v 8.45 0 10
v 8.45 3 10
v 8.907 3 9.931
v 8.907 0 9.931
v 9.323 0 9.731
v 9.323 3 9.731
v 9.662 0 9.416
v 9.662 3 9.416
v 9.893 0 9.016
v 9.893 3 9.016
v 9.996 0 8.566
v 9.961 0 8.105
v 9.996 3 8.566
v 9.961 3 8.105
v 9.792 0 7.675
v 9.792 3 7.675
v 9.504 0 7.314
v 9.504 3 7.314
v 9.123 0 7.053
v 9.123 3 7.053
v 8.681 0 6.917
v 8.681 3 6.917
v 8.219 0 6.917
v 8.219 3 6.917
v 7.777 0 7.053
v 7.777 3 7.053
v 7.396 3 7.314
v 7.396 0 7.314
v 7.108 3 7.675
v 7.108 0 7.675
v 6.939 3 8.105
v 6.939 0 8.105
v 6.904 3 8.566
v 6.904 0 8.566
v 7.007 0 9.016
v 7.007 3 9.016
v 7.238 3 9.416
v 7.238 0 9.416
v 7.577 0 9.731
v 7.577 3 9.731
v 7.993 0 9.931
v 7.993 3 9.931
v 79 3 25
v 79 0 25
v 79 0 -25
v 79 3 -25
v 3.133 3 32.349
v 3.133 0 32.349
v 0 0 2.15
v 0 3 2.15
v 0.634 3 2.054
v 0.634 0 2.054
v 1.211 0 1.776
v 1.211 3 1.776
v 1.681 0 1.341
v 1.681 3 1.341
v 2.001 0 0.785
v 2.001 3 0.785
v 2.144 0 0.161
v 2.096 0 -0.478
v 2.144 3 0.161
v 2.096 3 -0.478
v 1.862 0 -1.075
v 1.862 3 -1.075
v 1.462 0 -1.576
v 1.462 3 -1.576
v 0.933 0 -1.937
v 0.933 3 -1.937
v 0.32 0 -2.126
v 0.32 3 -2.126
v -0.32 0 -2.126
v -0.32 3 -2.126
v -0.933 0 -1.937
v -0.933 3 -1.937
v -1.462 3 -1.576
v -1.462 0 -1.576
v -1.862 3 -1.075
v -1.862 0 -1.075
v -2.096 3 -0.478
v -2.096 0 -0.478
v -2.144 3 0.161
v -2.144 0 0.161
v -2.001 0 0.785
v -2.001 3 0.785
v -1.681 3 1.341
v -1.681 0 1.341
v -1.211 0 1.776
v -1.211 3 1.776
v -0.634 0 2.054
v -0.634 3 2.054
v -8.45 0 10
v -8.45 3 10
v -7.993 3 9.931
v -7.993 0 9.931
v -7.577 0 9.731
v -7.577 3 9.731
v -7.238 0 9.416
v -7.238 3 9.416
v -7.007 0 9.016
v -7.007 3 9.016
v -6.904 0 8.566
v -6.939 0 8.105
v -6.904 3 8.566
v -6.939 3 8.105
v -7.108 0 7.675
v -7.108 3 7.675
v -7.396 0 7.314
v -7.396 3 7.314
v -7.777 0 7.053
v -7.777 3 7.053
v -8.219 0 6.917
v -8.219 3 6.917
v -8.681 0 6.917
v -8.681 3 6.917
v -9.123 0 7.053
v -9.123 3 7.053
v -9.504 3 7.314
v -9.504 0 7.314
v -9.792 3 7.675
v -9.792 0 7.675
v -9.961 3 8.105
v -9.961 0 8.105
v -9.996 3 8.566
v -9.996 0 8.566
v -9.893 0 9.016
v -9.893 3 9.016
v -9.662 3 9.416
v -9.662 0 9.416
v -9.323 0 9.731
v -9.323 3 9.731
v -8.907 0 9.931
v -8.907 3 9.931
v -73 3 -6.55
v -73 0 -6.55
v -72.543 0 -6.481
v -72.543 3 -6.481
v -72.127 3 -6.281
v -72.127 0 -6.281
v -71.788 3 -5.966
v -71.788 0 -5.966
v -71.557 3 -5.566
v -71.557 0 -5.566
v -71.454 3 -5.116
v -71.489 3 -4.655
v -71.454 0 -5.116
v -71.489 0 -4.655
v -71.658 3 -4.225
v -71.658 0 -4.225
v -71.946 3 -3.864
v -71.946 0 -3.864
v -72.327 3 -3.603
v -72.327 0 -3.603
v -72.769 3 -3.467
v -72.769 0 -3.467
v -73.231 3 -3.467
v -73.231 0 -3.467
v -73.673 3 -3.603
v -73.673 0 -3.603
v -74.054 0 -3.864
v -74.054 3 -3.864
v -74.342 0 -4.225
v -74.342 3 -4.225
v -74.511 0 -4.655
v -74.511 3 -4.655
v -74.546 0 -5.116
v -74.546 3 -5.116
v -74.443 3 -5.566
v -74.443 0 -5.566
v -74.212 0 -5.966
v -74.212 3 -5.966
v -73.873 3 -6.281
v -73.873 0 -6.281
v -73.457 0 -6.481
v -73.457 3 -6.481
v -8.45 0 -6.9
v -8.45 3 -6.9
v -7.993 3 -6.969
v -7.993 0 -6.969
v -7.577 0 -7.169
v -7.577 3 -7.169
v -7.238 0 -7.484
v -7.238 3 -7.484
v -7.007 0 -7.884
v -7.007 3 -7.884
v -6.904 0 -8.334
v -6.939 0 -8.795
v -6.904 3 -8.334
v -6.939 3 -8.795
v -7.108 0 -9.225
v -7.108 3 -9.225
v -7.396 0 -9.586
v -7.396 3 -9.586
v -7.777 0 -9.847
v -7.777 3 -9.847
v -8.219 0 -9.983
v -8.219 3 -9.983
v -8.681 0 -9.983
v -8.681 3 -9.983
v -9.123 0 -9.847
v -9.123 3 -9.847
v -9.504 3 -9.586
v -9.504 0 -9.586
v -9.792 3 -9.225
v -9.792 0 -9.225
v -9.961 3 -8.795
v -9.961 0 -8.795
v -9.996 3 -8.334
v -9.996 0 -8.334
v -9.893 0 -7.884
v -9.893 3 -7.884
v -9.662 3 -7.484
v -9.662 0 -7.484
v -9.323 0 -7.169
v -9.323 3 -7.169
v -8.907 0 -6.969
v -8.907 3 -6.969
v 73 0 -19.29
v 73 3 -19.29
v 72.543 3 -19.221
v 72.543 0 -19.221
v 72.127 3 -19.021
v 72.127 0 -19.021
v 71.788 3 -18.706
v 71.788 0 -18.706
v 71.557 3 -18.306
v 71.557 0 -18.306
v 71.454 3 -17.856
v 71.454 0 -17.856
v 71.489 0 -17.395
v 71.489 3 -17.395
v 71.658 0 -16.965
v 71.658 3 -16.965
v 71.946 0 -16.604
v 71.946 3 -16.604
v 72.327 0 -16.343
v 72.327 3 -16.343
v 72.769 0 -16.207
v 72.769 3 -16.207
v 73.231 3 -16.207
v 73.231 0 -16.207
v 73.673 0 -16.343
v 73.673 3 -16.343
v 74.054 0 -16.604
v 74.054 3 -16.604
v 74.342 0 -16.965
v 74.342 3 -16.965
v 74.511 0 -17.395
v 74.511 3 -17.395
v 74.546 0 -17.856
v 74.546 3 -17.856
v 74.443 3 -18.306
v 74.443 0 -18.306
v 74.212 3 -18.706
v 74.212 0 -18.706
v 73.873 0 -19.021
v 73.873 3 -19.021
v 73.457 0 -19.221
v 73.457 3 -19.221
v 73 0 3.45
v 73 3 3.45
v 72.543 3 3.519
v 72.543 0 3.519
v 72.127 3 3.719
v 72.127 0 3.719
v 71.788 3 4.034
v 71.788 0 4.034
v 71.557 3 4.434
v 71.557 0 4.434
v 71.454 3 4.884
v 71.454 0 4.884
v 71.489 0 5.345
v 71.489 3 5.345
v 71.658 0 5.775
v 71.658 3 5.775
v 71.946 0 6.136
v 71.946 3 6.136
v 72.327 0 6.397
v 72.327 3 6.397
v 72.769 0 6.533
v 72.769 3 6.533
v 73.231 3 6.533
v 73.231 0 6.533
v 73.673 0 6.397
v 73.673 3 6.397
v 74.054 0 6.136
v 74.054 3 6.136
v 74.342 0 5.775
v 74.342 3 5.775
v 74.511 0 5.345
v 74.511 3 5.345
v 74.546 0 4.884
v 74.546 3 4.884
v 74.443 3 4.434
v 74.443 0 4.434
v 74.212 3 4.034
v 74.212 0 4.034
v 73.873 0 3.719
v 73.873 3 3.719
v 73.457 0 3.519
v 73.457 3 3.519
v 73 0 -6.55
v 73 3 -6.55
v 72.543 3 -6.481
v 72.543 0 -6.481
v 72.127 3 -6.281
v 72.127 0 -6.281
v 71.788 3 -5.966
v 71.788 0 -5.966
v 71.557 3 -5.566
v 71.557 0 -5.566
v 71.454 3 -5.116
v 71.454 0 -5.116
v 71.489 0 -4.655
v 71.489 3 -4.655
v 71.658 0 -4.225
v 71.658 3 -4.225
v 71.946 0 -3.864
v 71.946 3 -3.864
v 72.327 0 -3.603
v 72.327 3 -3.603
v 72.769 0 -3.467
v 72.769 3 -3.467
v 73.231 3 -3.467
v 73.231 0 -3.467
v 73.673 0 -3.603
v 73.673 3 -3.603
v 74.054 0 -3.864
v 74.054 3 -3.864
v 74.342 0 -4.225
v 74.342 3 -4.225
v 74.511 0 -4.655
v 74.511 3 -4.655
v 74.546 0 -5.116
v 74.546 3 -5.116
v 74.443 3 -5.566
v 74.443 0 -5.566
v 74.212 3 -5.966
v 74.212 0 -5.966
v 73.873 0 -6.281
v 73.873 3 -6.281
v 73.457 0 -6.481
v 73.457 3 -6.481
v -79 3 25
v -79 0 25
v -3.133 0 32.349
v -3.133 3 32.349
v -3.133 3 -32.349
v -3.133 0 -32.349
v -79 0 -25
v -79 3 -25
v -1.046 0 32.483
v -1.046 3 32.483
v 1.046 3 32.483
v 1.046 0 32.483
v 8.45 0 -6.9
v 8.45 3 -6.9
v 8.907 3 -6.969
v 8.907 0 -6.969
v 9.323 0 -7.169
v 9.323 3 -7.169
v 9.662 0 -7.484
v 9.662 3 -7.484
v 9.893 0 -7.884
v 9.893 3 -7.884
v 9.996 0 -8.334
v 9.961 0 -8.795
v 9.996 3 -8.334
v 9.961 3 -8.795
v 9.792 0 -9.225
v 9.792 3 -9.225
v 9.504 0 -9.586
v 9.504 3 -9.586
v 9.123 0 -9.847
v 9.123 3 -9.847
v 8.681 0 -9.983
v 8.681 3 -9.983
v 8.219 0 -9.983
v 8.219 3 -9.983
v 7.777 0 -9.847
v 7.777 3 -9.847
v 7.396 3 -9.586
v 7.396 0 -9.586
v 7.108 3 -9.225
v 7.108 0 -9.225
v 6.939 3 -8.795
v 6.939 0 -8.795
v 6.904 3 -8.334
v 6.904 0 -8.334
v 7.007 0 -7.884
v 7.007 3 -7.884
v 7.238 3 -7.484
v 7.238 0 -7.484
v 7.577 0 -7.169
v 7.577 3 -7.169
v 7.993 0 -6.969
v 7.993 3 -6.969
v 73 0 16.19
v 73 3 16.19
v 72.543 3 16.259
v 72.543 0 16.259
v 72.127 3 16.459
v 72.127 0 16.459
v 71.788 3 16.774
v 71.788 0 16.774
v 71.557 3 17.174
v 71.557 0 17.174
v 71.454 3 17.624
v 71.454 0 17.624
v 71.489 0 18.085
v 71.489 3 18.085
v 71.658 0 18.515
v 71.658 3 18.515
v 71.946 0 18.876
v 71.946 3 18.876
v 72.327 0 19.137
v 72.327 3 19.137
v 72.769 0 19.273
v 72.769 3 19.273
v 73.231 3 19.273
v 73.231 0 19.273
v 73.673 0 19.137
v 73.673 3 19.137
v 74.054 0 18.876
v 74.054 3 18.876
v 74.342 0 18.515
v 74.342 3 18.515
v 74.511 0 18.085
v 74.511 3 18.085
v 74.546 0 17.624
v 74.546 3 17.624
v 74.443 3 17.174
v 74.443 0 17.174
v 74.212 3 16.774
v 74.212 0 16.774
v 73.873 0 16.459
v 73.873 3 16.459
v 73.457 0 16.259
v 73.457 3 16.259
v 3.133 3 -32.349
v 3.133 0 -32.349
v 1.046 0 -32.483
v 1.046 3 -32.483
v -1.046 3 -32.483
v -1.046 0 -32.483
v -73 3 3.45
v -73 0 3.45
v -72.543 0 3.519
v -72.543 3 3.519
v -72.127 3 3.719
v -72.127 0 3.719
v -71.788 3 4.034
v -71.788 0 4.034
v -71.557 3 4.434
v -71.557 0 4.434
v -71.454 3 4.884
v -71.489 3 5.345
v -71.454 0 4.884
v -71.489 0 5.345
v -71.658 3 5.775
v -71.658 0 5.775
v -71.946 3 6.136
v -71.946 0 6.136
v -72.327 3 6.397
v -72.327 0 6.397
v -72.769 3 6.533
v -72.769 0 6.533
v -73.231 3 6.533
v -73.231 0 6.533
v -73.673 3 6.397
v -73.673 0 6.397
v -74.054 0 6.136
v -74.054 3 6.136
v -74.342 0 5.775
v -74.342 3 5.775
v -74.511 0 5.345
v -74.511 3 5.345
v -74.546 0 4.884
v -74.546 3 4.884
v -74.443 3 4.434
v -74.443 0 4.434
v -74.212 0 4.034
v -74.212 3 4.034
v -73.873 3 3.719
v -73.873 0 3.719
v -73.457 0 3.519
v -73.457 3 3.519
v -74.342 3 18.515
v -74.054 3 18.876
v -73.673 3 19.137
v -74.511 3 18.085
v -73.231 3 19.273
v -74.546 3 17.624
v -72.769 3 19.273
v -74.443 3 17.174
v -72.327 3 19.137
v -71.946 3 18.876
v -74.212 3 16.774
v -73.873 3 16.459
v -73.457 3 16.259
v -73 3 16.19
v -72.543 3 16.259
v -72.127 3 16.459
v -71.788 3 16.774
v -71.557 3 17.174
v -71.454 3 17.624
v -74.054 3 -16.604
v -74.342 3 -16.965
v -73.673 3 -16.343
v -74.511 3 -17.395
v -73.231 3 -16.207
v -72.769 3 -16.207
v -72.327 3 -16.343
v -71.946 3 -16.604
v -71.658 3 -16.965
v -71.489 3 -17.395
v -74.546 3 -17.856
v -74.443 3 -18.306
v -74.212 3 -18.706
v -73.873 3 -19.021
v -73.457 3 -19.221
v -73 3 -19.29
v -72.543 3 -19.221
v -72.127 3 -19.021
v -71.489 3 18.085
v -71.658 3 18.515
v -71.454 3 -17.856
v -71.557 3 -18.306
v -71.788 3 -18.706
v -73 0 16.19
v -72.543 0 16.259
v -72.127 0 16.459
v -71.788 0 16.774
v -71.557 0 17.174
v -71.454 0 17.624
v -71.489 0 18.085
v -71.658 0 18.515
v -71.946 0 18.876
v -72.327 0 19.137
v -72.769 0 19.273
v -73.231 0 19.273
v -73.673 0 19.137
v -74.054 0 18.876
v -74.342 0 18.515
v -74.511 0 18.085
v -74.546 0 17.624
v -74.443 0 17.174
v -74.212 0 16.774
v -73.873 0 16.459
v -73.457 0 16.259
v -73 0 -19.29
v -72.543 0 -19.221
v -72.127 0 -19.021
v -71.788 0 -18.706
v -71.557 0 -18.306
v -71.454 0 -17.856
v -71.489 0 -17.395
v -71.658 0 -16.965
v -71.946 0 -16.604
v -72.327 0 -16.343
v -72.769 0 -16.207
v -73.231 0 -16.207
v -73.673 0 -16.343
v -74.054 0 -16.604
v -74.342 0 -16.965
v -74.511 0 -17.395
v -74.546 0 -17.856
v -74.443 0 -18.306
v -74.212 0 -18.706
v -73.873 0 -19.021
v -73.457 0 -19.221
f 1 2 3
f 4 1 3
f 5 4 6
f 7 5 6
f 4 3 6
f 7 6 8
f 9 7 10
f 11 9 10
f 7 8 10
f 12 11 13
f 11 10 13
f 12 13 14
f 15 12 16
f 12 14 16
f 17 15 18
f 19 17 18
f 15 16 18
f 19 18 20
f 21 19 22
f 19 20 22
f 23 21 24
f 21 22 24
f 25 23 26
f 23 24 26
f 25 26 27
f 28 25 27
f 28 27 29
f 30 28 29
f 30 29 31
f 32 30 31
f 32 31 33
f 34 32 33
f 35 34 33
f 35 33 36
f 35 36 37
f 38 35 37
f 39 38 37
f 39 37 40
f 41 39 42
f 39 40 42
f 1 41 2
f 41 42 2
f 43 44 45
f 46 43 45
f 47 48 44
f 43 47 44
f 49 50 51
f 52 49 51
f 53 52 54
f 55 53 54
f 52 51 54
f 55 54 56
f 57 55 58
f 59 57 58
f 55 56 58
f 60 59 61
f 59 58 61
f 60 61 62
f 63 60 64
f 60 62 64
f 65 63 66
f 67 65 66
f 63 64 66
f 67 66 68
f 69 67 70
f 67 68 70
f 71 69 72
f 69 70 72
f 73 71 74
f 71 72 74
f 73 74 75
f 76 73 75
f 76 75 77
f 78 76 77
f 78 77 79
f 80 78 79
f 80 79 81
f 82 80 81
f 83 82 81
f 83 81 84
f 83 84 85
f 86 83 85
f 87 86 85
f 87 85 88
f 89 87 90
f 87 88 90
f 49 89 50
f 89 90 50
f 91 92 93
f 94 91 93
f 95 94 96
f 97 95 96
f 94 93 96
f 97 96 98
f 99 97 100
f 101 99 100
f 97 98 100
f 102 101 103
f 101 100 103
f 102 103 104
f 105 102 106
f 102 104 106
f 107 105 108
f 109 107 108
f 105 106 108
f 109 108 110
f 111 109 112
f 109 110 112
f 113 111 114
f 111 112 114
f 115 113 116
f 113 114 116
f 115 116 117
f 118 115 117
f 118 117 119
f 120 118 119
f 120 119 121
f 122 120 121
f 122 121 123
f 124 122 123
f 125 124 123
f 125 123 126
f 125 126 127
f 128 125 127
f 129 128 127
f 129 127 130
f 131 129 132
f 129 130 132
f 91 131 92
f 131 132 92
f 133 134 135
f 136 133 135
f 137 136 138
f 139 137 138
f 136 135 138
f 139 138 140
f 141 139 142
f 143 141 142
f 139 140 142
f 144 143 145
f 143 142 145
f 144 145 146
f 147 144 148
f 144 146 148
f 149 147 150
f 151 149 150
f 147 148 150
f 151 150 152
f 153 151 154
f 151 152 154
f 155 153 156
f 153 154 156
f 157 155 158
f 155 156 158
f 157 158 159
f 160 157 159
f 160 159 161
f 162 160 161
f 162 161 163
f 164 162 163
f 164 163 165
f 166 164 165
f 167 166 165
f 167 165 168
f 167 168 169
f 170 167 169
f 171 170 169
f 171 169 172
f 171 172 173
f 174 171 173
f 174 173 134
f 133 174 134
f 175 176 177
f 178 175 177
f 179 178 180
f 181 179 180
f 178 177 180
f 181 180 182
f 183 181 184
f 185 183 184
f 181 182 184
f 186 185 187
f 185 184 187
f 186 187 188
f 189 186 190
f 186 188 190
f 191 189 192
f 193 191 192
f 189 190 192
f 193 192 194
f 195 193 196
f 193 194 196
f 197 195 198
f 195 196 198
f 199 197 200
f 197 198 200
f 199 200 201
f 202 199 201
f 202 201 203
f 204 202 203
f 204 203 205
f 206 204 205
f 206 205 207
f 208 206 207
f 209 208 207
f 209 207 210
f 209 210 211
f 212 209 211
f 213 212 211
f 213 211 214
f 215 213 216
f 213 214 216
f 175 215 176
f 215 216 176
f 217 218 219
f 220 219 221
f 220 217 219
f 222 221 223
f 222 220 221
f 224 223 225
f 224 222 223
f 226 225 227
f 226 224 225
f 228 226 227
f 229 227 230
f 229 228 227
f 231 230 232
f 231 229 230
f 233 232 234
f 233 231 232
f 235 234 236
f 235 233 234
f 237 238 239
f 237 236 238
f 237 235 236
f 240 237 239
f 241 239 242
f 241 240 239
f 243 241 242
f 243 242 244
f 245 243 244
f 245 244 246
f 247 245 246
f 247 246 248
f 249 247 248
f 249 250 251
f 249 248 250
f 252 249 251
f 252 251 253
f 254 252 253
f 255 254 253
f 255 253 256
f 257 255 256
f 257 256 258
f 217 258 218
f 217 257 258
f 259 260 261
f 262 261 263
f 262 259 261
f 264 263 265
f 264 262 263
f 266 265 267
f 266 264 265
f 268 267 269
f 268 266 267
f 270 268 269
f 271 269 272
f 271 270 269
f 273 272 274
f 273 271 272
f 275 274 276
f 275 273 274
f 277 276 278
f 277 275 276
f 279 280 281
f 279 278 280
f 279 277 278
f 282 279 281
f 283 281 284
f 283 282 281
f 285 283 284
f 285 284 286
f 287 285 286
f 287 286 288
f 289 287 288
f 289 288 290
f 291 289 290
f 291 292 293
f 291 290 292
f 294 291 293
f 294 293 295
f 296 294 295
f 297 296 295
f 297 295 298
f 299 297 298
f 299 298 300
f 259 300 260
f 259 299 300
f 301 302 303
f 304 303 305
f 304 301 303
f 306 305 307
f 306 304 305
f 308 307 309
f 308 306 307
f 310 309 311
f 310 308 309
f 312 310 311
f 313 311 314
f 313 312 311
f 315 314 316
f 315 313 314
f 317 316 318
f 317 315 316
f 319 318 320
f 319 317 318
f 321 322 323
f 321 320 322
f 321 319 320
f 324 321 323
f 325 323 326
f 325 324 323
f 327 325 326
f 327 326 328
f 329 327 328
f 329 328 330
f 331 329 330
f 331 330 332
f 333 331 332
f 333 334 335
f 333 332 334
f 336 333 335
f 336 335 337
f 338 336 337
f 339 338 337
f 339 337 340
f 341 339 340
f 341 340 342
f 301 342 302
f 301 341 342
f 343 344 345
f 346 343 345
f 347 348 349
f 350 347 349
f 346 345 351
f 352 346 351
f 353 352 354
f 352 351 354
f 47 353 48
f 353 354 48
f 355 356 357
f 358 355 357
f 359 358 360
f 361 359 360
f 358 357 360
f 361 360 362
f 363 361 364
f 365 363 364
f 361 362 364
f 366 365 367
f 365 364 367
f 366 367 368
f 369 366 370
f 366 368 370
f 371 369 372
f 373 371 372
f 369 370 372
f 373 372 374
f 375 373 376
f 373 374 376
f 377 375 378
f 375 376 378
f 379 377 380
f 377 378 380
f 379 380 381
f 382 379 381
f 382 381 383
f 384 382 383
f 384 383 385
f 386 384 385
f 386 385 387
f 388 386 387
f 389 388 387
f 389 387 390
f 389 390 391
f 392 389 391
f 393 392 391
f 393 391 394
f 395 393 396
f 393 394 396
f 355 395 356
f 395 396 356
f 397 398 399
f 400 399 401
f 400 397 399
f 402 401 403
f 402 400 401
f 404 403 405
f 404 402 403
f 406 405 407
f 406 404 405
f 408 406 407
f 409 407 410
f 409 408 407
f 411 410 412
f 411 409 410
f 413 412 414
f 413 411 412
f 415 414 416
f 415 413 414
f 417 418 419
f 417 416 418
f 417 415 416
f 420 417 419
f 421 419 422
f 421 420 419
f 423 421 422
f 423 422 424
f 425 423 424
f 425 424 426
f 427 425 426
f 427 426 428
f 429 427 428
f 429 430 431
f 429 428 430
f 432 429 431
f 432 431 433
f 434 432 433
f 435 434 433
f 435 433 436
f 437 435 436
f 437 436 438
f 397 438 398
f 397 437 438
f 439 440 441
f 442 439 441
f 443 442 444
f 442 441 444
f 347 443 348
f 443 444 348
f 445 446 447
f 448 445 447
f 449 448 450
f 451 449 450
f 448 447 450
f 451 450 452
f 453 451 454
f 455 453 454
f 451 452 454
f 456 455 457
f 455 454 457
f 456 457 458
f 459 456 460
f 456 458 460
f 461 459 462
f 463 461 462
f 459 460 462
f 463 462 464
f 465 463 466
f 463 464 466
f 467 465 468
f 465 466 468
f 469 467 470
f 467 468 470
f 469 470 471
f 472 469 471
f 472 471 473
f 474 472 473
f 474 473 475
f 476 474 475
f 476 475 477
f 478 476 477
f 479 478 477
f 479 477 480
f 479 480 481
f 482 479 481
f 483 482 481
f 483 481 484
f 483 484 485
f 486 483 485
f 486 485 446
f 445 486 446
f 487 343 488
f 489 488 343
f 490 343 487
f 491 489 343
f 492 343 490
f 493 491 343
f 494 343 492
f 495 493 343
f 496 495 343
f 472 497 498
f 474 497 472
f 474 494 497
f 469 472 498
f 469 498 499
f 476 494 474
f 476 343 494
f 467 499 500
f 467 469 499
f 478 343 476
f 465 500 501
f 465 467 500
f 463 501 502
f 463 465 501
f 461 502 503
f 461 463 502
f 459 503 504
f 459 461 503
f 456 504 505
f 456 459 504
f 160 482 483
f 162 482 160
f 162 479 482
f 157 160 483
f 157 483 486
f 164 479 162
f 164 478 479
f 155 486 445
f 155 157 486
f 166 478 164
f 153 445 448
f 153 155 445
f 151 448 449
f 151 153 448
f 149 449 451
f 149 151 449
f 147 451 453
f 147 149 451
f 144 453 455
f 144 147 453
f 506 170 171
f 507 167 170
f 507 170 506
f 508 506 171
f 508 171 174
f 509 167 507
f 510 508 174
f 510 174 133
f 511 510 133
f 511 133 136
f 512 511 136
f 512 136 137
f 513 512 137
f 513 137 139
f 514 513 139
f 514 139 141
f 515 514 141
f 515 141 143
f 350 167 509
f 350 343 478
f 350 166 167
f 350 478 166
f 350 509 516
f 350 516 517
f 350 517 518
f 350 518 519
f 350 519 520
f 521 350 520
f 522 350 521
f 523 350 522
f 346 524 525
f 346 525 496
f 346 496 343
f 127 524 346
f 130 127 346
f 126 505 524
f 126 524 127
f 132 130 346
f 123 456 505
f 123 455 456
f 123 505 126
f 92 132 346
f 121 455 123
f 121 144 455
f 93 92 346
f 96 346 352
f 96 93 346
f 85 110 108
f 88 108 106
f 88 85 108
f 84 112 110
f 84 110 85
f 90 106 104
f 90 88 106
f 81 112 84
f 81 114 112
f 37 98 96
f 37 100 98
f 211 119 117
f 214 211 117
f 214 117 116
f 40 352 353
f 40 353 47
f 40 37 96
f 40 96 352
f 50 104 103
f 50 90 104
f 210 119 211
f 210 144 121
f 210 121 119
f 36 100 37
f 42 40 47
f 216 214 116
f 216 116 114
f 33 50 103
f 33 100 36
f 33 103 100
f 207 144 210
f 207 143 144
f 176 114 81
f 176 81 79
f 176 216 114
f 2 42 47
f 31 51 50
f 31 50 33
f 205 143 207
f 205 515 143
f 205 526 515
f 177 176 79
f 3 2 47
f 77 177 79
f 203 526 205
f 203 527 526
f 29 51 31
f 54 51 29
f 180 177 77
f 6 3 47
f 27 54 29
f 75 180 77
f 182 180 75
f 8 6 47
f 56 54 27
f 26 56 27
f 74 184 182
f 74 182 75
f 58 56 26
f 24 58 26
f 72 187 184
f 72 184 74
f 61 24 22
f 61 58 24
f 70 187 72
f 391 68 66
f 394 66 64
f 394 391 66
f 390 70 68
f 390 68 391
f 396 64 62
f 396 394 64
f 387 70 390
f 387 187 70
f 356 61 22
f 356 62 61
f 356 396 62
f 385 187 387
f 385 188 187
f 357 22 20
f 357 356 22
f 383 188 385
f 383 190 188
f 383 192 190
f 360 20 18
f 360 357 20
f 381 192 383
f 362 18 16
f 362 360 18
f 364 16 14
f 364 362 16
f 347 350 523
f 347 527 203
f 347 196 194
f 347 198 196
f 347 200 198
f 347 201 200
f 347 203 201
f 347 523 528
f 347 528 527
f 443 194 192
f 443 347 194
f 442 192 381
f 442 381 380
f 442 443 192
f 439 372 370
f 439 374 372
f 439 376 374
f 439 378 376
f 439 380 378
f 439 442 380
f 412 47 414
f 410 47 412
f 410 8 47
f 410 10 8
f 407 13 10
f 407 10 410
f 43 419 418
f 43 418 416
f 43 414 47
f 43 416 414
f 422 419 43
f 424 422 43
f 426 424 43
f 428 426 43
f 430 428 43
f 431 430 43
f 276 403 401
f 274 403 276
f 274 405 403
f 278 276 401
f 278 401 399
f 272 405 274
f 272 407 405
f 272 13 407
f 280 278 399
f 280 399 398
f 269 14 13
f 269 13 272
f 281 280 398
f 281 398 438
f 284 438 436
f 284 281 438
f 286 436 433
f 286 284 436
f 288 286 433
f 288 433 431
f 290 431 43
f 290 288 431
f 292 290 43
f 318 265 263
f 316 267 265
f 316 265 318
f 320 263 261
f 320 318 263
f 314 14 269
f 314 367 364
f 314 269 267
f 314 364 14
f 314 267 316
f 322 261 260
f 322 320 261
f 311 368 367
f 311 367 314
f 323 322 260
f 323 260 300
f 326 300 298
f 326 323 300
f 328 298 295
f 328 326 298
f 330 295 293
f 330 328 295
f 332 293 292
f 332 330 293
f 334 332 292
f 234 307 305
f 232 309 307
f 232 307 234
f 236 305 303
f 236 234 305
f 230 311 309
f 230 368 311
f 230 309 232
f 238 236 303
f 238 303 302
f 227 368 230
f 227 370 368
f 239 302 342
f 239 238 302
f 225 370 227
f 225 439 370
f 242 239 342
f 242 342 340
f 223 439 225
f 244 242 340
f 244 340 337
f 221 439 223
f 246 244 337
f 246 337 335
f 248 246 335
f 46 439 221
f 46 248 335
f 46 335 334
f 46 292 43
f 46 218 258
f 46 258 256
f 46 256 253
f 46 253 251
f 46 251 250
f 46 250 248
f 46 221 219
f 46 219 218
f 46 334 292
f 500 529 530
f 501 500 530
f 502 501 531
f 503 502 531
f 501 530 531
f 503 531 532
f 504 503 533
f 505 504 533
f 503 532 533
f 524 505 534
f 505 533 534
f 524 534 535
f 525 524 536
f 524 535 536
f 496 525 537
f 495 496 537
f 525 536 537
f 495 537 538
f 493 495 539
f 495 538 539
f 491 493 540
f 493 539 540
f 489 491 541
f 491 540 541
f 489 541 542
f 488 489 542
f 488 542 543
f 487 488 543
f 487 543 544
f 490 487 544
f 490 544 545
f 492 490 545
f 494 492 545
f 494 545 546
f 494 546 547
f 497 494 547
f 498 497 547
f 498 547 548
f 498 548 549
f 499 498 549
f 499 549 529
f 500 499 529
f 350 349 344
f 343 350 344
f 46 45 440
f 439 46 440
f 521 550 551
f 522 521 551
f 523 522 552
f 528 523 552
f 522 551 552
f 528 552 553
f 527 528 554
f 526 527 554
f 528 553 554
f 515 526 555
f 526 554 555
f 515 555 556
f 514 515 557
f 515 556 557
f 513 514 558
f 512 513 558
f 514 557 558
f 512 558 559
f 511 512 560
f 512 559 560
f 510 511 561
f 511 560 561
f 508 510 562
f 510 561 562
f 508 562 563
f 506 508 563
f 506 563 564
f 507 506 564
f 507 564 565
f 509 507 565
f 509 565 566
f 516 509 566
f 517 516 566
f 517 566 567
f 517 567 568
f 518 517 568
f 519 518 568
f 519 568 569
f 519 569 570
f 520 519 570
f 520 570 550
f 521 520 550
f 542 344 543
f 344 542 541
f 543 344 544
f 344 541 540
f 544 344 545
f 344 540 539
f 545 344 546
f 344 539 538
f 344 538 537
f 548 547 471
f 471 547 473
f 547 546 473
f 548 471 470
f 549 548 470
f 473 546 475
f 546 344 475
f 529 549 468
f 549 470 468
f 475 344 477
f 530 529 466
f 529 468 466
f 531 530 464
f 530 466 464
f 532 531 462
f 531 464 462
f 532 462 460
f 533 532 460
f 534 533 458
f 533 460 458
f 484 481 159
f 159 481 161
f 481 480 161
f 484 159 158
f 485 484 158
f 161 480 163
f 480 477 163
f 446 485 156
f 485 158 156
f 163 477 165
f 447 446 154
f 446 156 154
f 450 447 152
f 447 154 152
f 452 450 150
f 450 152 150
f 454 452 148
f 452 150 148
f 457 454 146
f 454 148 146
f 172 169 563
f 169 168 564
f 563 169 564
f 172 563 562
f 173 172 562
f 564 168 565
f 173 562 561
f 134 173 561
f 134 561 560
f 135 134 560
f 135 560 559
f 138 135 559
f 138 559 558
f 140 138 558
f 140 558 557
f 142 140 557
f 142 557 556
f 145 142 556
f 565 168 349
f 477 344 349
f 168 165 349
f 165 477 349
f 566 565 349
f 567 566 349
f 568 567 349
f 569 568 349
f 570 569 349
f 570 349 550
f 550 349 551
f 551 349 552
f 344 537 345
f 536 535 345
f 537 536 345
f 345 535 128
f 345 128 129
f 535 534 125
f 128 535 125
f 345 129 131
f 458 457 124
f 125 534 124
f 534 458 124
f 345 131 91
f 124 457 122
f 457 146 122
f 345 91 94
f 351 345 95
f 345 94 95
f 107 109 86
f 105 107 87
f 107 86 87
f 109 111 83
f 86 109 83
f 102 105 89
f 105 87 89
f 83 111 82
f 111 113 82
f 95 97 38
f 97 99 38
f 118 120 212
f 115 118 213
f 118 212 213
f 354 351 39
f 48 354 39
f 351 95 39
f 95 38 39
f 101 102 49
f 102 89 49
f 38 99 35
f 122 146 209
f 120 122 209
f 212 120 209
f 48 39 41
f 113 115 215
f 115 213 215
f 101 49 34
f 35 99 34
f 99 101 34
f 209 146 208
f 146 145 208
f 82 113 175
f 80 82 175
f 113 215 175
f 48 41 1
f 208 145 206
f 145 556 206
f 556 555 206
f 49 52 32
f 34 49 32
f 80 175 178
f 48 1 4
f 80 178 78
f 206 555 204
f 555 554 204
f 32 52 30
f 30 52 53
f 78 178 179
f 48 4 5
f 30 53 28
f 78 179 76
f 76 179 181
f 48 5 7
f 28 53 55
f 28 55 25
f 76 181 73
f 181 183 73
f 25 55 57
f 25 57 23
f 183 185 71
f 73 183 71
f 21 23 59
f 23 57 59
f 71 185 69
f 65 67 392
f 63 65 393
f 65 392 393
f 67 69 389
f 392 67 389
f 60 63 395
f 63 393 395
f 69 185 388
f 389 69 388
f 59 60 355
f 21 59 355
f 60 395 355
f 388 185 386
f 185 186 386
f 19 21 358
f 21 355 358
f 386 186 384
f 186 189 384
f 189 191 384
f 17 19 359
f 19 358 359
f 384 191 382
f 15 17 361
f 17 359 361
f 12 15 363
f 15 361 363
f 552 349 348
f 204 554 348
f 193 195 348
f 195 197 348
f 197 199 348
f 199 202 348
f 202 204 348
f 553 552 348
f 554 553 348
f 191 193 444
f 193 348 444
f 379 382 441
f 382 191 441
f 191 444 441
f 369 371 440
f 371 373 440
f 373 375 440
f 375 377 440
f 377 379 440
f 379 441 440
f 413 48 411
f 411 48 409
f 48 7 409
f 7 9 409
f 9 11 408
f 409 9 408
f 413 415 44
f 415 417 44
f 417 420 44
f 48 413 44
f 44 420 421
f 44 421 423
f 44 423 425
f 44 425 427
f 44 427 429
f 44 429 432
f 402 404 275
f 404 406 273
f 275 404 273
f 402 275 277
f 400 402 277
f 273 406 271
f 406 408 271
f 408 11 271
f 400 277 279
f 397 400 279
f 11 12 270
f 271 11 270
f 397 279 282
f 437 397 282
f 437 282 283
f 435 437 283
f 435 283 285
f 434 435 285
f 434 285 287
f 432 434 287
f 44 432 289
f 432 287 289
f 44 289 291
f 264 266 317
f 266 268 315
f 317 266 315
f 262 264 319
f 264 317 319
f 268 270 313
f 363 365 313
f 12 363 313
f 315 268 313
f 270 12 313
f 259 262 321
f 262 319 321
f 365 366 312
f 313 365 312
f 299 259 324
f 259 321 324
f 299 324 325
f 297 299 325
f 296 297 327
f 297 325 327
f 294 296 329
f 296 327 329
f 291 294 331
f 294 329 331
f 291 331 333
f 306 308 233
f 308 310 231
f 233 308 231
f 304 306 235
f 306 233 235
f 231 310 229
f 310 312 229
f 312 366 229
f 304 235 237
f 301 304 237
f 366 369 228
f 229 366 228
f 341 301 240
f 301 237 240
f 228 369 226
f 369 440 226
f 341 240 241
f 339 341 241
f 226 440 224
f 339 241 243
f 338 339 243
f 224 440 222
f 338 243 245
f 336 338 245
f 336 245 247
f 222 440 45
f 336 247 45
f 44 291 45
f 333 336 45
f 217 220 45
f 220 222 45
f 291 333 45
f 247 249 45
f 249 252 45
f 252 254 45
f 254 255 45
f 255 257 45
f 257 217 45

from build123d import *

# Parameters (mm, degrees)
EXTRUDE_1_DEPTH     = 3
SKETCH_2_R          = 1.55
SKETCH_2_R_2        = 2.15
CUT_EXTRUDE_1_DEPTH = 3
SKETCH_3_R          = 1.55
CUT_EXTRUDE_2_DEPTH = 4


with BuildPart() as part:
    # 草图1 → 凸台-拉伸1 (new body)
    with BuildSketch(Plane(origin=(0, 0, 0), x_dir=(1, 0, 0), z_dir=(0, 1, 0))):
        with BuildLine():
            Line((-79, 25), (-79, -25))
            Line((-79, -25), (-3.133353582, -32.34860268))
            ThreePointArc((-3.133353582, -32.34860268), (0, -32.5), (3.133353582, -32.34860268))
            Line((3.133353582, -32.34860268), (79, -25))
            Line((79, -25), (79, 25))
            Line((79, 25), (3.133353582, 32.34860268))
            ThreePointArc((3.133353582, 32.34860268), (0, 32.5), (-3.133353582, 32.34860268))
            Line((-3.133353582, 32.34860268), (-79, 25))
        make_face()
    extrude(amount=EXTRUDE_1_DEPTH)

    # 草图2 → 切除-拉伸1 (cut)
    with BuildSketch(Plane(origin=(0, 3, 0), x_dir=(1, 0, 0), z_dir=(0, 1, 0))):
        with Locations(Location((-8.45, 8.45, 0), (0, 0, 270))):
            Circle(SKETCH_2_R)
        with Locations(Location((8.45, 8.45, 0), (0, 0, 270))):
            Circle(SKETCH_2_R)
        with Locations(Location((8.45, -8.45, 0), (0, 0, 270))):
            Circle(SKETCH_2_R)
        with Locations(Location((-8.45, -8.45, 0), (0, 0, 270))):
            Circle(SKETCH_2_R)
        with Locations(Location((0, 0, 0), (0, 0, 270))):
            Circle(SKETCH_2_R_2)
    extrude(amount=-CUT_EXTRUDE_1_DEPTH, mode=Mode.SUBTRACT)

    # 草图3 → 切除-拉伸2 (cut)
    with BuildSketch(Plane.XZ):
        with Locations(Location((-73, 17.74, 0), (0, 0, 270))):
            Circle(SKETCH_3_R)
        with Locations(Location((-73, 5, 0), (0, 0, 270))):
            Circle(SKETCH_3_R)
        with Locations(Location((-73, -5, 0), (0, 0, 270))):
            Circle(SKETCH_3_R)
        with Locations(Location((-73, -17.74, 0), (0, 0, 270))):
            Circle(SKETCH_3_R)
    cut_extrude_2 = extrude(amount=-CUT_EXTRUDE_2_DEPTH, mode=Mode.SUBTRACT)

    # 镜向1: 切除-拉伸2 across plane
    add(cut_extrude_2.mirror(Plane(origin=(0, 0, 0), x_dir=(0, 0, 1), z_dir=(1, 0, 0))), mode=Mode.SUBTRACT)


solid = part.part
